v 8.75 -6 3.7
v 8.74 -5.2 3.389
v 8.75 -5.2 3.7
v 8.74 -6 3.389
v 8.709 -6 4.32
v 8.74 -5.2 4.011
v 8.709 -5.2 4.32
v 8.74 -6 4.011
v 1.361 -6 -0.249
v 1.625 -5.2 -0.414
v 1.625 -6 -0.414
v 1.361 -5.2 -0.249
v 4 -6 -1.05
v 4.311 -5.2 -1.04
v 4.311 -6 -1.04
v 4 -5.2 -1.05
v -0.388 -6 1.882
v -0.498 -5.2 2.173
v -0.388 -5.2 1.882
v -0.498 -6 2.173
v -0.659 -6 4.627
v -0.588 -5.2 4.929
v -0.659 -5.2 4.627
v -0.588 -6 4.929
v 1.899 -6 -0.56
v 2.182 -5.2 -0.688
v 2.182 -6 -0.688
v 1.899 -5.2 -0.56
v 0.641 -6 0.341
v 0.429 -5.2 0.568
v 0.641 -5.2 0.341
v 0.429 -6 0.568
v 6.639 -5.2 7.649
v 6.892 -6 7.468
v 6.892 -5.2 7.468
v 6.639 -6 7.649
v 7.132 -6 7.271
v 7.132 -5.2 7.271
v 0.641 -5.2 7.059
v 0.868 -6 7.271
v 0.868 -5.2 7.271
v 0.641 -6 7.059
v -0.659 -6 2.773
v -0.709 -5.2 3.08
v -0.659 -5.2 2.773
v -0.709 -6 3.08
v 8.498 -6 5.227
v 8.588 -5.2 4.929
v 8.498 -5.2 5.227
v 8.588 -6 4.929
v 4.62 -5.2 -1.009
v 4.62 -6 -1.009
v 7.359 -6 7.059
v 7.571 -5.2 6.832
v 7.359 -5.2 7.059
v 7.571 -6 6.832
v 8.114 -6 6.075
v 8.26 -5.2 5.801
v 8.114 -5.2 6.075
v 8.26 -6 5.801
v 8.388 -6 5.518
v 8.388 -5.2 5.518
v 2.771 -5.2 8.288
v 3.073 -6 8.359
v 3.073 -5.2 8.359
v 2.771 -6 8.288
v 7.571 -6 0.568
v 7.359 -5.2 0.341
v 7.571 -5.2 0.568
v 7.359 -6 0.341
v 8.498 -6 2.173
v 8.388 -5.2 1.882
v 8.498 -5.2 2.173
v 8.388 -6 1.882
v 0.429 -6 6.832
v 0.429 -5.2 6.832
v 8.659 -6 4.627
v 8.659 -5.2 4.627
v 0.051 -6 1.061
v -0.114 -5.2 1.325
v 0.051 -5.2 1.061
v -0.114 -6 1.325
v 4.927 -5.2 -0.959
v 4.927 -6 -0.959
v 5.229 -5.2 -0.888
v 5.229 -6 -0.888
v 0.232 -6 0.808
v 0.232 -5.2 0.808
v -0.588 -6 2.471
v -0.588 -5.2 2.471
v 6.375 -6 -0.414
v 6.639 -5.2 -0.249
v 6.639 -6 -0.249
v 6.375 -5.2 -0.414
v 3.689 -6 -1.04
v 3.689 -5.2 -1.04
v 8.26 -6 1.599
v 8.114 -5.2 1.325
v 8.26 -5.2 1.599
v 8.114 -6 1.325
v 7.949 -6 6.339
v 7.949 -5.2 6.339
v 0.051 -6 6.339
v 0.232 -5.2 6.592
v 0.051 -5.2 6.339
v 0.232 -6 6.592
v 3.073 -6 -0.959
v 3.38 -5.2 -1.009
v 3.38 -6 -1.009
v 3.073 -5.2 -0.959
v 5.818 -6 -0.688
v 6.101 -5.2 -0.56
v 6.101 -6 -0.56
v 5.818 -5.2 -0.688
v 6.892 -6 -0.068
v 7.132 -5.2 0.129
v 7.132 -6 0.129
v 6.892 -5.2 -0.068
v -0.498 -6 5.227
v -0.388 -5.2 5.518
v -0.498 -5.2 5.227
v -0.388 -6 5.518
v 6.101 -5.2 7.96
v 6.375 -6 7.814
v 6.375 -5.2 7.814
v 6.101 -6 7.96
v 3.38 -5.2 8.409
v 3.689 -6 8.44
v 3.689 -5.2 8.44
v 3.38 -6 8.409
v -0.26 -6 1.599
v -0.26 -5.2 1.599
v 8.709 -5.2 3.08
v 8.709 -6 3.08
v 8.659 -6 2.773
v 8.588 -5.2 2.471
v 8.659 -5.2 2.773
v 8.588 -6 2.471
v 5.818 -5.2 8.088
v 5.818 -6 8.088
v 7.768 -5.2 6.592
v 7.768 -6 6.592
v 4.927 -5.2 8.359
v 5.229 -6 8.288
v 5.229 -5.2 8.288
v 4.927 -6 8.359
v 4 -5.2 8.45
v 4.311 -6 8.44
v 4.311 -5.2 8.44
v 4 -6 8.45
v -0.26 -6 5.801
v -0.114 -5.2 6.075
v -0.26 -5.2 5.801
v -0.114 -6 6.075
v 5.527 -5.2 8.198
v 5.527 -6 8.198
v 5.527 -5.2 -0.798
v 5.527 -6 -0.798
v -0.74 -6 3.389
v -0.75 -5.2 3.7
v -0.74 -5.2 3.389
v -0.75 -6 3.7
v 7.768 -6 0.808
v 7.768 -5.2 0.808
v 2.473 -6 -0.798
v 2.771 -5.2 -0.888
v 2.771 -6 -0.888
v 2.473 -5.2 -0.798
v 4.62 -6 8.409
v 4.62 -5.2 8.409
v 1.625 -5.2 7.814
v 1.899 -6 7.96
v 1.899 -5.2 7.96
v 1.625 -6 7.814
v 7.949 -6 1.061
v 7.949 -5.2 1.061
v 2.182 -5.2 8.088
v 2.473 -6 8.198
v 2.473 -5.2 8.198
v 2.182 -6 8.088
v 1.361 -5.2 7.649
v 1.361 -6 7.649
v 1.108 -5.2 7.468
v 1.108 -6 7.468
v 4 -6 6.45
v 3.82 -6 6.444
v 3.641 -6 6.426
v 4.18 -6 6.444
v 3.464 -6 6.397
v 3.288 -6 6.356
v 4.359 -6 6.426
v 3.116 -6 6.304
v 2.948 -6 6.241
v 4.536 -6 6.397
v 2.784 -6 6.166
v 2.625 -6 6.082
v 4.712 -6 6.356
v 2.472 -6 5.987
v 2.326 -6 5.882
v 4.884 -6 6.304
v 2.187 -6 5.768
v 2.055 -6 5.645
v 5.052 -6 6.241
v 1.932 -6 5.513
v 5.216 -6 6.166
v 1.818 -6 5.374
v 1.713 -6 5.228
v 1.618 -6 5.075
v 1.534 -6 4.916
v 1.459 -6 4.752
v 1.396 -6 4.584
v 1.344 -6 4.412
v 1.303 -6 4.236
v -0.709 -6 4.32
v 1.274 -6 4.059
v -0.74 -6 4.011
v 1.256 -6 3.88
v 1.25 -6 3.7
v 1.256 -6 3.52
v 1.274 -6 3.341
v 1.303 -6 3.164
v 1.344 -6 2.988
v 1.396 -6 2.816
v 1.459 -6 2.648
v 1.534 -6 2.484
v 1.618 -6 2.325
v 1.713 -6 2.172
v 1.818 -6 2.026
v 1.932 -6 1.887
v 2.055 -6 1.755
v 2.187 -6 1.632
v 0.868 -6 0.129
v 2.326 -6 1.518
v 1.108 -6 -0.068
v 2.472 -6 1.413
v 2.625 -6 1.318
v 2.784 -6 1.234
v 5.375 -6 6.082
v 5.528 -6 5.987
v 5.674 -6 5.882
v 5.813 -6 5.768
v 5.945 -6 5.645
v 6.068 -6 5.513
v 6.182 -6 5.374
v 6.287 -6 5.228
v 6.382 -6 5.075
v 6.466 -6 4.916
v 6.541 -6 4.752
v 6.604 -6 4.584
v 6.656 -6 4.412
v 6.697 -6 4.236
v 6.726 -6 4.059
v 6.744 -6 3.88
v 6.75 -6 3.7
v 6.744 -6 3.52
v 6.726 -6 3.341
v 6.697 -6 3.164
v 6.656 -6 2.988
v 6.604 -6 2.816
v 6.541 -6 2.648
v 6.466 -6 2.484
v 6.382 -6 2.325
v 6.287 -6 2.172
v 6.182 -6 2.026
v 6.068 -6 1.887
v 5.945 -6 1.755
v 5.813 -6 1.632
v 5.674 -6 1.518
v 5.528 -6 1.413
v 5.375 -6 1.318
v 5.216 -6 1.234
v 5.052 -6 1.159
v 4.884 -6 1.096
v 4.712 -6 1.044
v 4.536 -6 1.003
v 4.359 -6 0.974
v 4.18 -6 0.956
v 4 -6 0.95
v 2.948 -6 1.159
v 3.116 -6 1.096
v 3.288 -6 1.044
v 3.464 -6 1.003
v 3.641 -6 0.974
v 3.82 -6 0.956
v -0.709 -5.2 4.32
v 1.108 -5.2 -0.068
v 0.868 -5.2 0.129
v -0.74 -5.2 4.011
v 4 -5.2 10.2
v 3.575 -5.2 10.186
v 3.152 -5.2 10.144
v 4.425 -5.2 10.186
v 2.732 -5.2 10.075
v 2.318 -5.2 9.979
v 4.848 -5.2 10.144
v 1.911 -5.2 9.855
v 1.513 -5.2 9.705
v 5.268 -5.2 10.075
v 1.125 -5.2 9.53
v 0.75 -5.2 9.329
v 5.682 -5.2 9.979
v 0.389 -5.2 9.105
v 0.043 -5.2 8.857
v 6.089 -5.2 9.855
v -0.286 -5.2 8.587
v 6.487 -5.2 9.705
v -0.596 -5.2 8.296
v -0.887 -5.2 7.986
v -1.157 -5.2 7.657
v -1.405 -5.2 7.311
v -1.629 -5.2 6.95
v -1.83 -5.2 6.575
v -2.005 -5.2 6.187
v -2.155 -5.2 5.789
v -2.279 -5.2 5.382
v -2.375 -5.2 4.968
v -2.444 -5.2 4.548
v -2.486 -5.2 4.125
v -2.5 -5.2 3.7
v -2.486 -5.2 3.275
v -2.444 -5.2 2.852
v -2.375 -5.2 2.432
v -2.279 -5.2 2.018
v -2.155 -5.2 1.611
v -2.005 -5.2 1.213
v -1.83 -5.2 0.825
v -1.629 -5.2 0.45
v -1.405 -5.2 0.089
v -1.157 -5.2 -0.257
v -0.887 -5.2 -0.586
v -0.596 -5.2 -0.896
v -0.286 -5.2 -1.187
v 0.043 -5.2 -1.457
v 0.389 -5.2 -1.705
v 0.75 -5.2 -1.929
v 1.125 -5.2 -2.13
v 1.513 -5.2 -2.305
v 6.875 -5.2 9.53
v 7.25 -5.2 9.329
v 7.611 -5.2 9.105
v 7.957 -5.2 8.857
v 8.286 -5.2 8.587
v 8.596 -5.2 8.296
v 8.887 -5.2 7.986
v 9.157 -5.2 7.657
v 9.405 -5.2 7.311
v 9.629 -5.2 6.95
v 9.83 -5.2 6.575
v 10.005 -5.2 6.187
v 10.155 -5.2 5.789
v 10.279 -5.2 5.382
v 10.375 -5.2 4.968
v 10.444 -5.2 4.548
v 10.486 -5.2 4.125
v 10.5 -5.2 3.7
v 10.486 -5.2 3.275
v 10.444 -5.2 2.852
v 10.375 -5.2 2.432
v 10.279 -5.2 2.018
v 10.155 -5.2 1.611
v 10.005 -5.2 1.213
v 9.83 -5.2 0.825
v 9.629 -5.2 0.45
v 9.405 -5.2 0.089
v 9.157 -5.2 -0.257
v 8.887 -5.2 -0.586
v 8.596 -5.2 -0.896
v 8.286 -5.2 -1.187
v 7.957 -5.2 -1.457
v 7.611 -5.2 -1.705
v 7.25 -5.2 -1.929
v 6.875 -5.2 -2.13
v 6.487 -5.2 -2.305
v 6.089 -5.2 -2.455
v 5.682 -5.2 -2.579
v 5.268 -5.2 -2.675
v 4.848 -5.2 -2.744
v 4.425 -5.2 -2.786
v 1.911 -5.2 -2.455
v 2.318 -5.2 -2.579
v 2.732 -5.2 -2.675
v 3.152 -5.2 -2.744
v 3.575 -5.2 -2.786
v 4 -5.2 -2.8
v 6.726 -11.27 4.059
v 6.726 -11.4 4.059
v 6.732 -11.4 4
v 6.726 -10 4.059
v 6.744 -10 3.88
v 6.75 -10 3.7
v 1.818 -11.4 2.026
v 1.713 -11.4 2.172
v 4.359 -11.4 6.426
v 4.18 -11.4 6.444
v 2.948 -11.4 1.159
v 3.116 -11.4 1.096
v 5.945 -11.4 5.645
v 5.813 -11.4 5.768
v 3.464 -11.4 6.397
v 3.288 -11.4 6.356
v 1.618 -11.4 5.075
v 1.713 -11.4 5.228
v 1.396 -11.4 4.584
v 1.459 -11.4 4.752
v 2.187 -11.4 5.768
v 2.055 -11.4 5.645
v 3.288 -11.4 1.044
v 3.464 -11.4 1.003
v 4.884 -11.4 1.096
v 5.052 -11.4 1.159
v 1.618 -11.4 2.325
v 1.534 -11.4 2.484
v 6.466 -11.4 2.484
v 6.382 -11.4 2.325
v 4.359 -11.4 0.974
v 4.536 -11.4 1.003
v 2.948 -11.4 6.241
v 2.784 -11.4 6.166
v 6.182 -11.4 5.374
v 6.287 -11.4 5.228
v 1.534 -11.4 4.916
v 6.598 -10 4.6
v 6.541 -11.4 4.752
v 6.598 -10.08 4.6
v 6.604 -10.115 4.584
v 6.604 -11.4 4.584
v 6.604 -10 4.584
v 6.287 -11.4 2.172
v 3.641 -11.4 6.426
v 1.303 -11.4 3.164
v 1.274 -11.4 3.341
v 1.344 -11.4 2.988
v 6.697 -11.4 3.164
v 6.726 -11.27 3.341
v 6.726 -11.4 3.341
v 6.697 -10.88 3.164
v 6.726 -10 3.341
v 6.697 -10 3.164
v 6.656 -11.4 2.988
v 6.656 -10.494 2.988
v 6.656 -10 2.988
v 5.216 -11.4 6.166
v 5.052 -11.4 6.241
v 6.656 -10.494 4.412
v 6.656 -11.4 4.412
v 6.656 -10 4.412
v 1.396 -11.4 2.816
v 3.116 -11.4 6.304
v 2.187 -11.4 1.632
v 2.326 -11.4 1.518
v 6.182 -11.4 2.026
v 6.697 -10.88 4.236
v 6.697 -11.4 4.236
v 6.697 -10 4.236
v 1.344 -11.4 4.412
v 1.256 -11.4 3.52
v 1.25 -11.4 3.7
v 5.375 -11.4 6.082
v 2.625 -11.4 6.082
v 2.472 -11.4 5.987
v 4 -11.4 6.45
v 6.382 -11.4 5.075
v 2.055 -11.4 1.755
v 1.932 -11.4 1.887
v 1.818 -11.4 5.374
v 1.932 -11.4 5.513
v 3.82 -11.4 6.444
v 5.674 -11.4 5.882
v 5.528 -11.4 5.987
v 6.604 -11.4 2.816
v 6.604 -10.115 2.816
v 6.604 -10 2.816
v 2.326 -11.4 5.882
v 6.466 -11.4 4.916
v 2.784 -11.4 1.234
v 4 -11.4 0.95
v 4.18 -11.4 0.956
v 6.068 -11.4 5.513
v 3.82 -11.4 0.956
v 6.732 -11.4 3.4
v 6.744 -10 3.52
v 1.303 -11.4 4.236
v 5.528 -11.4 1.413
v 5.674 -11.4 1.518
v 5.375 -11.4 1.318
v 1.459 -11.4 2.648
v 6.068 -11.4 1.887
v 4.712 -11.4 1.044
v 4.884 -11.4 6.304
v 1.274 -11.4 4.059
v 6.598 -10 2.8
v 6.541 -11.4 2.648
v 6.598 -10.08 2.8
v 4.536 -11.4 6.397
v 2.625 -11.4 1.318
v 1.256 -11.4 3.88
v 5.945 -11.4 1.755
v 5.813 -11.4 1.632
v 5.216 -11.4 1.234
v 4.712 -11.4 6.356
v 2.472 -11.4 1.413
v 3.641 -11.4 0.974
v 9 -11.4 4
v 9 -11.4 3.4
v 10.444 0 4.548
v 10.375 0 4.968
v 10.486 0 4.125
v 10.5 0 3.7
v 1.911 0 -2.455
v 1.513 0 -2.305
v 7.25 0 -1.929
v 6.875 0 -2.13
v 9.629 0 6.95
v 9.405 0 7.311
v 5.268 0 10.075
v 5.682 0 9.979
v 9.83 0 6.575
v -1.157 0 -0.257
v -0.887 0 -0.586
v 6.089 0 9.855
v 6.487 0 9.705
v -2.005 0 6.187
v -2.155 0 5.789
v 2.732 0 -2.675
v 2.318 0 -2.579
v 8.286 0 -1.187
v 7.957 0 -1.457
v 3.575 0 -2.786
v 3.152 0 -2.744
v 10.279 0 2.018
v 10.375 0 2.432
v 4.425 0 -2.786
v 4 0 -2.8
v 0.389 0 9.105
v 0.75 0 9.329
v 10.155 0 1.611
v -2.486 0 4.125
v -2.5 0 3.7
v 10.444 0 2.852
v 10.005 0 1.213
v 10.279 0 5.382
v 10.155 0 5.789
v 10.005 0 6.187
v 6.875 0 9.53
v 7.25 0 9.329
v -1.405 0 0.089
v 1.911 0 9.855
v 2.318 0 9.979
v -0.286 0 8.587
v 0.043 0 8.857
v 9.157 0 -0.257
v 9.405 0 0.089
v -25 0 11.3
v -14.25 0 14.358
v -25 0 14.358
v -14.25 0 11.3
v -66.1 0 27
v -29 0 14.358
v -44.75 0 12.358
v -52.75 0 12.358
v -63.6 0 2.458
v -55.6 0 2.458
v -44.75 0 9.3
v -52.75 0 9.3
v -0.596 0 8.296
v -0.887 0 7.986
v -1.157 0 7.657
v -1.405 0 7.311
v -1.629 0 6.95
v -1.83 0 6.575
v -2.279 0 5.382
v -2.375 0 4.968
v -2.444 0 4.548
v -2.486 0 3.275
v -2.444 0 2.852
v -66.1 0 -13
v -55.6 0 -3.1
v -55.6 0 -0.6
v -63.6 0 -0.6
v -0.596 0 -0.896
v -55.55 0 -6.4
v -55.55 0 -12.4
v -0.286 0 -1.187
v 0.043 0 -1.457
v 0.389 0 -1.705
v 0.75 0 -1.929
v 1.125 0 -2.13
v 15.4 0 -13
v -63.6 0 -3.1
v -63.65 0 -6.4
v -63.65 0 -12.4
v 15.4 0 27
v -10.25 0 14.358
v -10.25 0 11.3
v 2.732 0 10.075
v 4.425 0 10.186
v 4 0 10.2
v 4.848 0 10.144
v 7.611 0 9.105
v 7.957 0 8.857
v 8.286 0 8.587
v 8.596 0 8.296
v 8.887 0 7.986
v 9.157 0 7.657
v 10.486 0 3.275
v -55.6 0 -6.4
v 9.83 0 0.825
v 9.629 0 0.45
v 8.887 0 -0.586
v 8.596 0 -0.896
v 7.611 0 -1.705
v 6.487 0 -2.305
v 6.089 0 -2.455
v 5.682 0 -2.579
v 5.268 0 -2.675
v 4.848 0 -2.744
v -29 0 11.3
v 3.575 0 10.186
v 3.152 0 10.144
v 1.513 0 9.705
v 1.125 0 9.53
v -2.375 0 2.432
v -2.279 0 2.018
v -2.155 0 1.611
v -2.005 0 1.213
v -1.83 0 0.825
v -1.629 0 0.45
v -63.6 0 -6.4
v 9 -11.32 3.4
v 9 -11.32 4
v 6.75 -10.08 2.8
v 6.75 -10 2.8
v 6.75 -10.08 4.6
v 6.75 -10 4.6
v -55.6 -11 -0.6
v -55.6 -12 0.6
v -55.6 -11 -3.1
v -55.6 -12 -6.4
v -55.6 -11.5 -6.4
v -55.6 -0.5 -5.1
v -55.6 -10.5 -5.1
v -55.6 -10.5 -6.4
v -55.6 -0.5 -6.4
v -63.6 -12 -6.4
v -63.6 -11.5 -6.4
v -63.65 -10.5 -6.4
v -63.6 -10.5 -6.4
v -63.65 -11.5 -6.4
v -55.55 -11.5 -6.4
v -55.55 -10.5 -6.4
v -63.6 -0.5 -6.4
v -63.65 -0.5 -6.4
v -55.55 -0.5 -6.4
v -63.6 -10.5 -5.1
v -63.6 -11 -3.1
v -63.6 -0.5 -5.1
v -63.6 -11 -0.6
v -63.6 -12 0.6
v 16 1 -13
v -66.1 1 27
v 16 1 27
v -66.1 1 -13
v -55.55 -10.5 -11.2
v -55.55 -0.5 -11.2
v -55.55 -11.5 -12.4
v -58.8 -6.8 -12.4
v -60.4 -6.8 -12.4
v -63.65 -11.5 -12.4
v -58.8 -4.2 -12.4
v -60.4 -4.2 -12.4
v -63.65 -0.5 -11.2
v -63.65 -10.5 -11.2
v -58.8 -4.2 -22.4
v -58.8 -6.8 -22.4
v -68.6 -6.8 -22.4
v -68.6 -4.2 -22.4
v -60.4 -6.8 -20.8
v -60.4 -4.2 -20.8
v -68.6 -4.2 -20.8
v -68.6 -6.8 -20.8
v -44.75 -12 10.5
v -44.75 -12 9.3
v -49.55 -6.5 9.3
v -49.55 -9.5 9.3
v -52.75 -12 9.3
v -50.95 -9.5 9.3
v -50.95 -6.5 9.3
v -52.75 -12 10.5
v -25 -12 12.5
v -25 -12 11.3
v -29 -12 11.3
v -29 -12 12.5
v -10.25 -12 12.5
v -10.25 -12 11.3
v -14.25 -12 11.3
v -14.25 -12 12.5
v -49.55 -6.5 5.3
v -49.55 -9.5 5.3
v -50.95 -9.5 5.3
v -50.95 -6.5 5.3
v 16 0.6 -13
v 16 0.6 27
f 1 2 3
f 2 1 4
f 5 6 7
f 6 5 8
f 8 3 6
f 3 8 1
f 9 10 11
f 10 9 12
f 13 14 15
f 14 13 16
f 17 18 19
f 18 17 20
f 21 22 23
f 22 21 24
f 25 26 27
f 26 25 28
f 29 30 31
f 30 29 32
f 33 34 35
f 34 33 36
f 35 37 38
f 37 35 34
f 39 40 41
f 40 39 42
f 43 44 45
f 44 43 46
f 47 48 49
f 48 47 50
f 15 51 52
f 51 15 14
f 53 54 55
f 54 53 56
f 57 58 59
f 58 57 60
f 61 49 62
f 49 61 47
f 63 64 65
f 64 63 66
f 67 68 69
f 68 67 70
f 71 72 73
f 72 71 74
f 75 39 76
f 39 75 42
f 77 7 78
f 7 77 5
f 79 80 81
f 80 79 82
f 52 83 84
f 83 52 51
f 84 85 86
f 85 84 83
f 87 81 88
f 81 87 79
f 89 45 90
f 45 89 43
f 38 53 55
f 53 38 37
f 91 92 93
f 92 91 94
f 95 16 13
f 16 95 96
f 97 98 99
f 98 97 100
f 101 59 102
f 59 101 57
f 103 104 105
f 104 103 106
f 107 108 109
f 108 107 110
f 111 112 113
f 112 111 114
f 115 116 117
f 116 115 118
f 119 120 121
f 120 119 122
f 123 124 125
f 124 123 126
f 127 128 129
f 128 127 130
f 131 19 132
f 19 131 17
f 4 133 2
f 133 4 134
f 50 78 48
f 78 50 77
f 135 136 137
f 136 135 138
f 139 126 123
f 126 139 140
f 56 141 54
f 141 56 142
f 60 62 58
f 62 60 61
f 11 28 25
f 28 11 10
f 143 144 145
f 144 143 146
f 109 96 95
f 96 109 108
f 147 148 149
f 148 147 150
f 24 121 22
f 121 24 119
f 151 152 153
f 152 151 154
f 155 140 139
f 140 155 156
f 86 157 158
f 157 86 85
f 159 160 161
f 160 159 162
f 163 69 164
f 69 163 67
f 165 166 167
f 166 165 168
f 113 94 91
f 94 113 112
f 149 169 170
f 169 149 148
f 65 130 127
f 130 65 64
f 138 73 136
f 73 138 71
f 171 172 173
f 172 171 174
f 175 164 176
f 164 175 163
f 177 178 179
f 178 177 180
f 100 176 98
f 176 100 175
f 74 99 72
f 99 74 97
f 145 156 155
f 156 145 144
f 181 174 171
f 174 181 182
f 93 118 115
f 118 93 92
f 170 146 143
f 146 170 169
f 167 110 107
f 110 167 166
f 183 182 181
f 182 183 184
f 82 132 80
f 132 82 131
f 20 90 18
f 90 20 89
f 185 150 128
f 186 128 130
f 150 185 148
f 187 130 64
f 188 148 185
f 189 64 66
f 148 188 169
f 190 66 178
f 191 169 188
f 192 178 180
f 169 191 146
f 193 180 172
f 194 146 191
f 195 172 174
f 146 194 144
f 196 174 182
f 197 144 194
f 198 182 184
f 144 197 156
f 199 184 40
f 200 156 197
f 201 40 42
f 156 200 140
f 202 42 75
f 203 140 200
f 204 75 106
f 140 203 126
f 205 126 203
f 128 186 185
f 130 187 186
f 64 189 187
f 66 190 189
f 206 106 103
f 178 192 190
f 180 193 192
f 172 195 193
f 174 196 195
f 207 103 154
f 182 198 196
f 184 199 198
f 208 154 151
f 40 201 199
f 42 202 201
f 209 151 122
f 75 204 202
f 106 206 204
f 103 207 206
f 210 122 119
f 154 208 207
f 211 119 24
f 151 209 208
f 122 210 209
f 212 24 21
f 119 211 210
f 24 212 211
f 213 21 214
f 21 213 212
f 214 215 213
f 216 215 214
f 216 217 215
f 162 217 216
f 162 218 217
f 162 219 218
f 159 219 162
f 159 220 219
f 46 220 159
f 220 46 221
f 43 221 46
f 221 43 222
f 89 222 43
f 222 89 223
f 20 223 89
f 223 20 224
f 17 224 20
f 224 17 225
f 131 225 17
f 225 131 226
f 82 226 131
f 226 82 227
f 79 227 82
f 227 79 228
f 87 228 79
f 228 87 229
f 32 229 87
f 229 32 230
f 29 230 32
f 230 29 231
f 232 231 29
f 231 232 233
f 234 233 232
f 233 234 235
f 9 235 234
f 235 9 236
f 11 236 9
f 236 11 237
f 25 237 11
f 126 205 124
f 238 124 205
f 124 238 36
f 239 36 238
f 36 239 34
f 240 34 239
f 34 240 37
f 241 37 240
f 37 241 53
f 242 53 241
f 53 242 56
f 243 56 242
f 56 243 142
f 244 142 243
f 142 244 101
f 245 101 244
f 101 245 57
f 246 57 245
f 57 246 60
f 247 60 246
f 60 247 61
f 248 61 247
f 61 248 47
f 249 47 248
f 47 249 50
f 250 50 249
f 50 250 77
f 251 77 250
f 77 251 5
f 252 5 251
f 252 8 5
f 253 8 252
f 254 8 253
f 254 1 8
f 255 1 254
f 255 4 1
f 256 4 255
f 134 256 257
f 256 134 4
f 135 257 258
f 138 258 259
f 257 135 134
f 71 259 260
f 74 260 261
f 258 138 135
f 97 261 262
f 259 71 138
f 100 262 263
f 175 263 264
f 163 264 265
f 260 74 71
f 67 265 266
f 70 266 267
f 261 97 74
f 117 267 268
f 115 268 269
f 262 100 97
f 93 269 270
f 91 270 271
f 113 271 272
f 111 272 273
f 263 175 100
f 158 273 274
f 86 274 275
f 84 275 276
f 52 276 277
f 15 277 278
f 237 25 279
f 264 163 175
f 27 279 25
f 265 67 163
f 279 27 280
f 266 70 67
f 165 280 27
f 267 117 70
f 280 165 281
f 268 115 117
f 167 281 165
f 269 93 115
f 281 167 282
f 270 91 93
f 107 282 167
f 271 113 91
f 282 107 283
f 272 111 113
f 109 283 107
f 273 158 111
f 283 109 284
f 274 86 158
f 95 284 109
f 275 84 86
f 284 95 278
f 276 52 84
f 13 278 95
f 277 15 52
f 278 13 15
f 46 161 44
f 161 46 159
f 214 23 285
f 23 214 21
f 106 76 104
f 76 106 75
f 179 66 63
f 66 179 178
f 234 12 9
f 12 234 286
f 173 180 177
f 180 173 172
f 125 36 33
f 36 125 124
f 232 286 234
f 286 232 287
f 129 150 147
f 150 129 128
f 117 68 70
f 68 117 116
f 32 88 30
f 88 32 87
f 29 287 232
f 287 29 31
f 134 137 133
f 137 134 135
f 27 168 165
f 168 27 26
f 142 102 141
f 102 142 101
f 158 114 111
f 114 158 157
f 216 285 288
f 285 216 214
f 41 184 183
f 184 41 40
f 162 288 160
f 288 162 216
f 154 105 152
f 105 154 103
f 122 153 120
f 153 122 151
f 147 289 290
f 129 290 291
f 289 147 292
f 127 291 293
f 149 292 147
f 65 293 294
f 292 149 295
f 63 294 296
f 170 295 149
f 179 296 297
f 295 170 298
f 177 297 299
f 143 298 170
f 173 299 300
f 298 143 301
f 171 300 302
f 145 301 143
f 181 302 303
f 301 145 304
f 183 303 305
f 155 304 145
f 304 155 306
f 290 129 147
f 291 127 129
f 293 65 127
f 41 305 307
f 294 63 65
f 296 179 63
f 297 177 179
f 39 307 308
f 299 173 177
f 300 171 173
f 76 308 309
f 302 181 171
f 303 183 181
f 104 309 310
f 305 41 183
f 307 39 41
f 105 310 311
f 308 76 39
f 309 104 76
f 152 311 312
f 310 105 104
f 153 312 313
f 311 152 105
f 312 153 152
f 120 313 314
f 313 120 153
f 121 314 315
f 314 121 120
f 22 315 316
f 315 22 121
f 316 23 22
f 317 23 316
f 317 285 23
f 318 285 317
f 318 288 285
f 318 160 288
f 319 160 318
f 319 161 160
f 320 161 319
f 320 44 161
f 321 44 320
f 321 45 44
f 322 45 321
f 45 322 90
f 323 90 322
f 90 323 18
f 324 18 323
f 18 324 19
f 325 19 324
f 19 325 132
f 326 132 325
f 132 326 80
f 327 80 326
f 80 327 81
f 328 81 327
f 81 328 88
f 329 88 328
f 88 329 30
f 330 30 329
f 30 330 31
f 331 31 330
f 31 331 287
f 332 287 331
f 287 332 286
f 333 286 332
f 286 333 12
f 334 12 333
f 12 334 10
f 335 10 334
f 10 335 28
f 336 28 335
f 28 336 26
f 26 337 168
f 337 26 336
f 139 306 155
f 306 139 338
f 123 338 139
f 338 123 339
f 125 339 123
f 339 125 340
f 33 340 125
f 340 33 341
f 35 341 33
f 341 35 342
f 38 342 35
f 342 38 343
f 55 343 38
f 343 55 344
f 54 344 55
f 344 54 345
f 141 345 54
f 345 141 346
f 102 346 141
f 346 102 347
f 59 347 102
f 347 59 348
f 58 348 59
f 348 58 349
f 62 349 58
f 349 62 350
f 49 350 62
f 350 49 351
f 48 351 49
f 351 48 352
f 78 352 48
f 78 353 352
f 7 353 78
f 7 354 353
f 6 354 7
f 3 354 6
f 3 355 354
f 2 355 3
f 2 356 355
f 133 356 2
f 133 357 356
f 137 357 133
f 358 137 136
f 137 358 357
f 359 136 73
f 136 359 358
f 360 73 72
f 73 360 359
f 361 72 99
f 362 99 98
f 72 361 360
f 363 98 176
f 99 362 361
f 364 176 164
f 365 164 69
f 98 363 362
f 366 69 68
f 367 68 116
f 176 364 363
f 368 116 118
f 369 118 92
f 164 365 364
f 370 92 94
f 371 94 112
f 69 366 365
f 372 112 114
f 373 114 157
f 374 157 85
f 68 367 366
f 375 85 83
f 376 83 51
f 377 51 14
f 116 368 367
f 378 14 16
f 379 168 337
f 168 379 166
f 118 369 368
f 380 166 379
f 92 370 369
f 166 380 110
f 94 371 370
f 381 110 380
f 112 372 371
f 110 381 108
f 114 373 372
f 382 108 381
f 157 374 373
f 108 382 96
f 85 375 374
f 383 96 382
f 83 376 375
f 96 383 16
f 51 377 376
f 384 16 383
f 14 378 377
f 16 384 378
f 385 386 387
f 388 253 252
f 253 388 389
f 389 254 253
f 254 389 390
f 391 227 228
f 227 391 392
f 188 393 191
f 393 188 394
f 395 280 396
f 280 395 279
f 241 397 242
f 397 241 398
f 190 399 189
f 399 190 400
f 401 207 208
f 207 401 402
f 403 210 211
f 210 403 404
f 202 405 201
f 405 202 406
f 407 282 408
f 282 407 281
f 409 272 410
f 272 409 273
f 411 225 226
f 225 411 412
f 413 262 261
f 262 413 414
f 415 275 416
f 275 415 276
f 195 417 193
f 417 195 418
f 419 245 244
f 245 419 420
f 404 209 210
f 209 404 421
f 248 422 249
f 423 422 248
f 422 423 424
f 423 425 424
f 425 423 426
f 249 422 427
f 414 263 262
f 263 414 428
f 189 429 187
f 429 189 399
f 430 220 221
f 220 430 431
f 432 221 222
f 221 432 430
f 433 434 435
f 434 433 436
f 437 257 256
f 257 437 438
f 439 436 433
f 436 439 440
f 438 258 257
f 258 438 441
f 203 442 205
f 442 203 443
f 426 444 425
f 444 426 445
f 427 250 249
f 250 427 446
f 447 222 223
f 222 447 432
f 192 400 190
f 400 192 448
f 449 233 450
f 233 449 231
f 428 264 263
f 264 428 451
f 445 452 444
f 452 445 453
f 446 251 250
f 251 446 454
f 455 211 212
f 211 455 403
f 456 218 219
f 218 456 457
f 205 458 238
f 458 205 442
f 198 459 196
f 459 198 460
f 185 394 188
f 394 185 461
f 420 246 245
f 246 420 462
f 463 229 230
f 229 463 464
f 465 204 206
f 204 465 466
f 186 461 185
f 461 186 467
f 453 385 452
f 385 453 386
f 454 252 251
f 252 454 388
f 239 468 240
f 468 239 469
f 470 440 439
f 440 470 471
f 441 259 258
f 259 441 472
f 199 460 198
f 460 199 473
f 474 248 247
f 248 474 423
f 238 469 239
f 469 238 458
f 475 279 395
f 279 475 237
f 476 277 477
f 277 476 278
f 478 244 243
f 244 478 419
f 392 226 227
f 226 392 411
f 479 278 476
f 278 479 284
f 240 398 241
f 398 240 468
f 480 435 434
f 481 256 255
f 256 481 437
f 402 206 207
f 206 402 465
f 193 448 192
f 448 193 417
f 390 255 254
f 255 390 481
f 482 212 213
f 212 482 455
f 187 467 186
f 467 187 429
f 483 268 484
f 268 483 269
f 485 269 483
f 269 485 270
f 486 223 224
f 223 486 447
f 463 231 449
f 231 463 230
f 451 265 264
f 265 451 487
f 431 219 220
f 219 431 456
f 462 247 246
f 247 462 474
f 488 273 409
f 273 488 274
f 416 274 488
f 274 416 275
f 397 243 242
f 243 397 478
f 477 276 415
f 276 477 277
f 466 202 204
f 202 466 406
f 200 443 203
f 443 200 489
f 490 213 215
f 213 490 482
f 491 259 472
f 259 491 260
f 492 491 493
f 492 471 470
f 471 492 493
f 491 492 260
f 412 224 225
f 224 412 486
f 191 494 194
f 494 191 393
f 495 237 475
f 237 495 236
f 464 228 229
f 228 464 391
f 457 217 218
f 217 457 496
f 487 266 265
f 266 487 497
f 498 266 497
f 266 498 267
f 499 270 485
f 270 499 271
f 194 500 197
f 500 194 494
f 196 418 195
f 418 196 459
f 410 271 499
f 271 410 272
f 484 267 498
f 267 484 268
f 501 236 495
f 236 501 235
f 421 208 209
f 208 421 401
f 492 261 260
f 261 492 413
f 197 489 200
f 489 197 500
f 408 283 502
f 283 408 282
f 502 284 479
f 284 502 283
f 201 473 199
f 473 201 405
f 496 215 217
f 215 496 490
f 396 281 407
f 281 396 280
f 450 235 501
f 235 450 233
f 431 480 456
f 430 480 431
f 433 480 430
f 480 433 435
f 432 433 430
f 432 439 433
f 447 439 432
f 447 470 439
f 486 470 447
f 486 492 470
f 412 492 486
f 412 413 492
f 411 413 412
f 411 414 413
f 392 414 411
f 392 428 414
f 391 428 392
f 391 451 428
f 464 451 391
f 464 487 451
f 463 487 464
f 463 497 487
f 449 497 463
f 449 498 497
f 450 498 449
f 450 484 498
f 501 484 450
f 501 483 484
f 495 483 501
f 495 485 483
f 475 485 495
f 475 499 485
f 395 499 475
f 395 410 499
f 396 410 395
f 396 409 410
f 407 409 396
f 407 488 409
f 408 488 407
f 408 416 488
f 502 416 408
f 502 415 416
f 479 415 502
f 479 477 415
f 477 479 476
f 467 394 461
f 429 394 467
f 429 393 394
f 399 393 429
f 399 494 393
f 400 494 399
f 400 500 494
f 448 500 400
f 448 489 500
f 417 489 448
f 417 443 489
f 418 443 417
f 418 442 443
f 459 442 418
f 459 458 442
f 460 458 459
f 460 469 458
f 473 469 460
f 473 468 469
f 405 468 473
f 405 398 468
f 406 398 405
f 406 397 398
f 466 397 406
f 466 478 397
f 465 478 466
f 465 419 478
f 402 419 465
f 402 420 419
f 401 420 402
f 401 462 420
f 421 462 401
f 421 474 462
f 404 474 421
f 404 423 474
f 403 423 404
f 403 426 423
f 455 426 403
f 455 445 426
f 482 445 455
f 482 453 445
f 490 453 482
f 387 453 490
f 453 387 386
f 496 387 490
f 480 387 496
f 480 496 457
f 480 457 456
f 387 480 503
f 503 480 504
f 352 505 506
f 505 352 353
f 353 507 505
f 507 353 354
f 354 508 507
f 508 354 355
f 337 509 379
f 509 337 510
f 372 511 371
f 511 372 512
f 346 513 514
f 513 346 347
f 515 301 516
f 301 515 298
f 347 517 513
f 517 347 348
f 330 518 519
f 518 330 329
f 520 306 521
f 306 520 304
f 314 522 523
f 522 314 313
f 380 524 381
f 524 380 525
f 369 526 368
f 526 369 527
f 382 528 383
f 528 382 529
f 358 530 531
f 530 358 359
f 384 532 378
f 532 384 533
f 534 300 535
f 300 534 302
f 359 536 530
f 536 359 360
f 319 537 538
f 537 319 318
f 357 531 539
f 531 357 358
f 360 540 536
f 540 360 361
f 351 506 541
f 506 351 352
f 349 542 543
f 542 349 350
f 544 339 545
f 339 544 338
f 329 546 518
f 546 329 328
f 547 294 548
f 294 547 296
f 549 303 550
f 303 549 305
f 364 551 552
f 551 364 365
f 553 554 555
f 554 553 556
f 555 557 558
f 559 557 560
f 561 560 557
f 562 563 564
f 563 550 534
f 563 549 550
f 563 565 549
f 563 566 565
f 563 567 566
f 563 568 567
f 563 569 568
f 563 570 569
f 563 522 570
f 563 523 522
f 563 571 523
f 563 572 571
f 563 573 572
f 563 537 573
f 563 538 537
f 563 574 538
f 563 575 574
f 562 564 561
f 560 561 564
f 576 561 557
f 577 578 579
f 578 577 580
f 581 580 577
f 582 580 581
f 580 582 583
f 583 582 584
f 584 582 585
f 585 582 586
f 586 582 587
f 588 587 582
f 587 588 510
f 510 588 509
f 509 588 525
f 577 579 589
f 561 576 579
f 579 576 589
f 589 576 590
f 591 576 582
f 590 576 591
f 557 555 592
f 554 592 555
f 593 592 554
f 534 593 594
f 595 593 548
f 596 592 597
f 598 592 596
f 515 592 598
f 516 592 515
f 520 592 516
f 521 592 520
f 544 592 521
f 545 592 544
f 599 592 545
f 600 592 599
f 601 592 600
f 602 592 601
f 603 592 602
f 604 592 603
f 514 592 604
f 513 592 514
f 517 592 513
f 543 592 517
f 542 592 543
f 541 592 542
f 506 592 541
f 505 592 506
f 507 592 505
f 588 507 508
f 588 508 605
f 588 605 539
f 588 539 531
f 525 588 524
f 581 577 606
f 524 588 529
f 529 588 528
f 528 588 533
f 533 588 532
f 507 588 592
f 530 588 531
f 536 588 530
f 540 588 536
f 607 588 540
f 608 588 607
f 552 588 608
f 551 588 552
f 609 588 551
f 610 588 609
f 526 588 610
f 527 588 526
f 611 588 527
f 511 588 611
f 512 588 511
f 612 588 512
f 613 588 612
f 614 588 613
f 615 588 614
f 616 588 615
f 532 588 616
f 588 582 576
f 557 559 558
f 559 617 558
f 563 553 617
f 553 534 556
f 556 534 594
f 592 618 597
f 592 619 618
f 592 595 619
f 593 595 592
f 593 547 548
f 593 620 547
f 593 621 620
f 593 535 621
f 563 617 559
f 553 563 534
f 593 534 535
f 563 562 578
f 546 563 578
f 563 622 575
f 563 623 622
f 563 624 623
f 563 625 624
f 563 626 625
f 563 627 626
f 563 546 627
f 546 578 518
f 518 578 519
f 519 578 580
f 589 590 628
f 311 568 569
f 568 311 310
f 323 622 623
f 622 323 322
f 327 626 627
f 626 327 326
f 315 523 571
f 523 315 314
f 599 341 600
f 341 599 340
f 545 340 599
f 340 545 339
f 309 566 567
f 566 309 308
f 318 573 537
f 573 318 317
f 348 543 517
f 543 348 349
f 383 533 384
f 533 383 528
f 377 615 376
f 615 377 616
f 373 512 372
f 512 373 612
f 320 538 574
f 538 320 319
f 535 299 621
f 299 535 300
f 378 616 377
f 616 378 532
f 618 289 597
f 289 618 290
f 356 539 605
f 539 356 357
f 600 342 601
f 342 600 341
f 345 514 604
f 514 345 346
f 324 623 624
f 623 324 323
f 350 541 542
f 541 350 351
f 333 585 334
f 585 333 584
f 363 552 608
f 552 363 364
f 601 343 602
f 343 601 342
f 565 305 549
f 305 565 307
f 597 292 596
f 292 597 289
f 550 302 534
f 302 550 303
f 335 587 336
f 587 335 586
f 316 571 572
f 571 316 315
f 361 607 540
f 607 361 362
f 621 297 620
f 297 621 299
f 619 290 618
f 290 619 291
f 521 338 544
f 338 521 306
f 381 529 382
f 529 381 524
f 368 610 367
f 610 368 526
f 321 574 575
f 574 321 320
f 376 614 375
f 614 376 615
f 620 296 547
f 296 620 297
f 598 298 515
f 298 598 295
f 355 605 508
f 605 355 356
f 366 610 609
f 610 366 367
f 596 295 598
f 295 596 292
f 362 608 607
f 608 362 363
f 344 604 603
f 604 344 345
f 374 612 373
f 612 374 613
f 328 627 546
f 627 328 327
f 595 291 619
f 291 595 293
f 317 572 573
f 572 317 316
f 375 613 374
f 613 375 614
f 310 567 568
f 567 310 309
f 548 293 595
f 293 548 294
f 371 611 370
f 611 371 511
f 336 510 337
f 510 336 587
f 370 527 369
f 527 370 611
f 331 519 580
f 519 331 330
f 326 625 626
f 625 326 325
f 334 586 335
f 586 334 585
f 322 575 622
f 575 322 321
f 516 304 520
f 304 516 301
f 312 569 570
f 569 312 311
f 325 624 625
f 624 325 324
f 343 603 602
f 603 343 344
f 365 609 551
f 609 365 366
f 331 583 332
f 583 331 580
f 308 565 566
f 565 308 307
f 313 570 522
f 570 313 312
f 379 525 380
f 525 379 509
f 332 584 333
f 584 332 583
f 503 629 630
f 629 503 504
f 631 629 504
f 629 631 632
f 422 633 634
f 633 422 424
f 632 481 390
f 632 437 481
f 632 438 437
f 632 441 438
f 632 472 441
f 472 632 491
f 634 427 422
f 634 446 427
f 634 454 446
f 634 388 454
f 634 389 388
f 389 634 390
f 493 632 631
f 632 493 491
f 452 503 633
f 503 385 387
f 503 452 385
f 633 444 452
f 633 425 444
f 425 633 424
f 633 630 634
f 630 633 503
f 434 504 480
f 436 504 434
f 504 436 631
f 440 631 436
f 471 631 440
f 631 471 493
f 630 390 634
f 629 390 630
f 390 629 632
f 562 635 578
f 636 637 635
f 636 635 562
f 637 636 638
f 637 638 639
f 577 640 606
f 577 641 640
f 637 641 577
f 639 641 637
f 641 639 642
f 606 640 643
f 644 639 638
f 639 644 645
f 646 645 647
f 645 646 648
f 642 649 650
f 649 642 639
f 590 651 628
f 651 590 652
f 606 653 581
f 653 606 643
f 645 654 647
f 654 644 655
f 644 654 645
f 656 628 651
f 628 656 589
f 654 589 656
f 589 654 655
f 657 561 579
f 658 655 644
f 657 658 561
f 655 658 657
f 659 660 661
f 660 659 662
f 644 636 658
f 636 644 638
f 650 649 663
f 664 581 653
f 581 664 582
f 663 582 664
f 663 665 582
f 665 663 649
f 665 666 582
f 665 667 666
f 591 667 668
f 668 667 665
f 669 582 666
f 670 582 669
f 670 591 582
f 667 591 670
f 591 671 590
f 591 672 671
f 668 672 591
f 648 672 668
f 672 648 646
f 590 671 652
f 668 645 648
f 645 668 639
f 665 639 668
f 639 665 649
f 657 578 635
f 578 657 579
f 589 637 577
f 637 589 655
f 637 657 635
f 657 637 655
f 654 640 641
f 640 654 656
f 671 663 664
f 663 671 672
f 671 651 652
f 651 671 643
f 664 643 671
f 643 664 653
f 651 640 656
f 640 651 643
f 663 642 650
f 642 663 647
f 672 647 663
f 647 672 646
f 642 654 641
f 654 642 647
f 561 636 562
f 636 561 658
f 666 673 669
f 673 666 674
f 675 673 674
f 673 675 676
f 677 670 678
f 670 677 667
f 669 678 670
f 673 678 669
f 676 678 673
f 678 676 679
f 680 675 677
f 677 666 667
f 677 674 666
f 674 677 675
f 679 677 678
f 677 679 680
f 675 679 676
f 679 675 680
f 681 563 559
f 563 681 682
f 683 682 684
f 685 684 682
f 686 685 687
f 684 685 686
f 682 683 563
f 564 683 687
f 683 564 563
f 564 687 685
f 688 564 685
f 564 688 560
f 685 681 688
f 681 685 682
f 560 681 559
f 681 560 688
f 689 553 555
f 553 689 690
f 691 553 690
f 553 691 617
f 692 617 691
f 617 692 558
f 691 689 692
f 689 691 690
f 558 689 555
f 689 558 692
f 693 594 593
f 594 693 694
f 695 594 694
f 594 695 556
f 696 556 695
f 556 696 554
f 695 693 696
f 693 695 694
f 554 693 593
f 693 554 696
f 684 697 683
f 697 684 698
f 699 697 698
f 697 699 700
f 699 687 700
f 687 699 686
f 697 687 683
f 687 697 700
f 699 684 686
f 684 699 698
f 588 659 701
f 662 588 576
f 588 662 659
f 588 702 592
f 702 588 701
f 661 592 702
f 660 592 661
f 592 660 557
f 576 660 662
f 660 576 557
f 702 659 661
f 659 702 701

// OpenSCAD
// DOUBLE TAKE FRAMES — STANDARD/WET CLIPLESS KEYED LATCH RIG
// DTF_RELEASE: 4.0.0
// Release revision: 4.0.0
// Versioning: Semantic Versioning 2.0.0 (https://semver.org/)
// Status: CANONICAL.
// Set wet=false for the unchanged neutral/standard wall rig. Set wet=true to
// mirror the complete fixed rig in X and omit the zipper tunnel/crook package.
// The wet pivot and bayonet therefore move to the opposite end so the latch
// swings toward the intact side of its suspension line rather than toward the
// side-load break.
// Pending change: adds a print-friendly bayonet stop lug to the pivot peg so
// the keyed latch needs no C-clip. On this mirrored dry-wall rig, the lug faces
// outward toward +X (right in the backside/SCAD view), preventing the released, downward-
// hanging latch keyway from aligning with it and slipping off.
// Changes in 2.0.4:
// - Carried forward unchanged for the coordinated capstan and clock-string-guide release.
// Changes in 2.0.3:
// - Carried forward unchanged for the corrected prepared-project packaging.
// Changes in 2.0.2:
// - Carried forward unchanged for the native 3MF packaging hotfix.
// Changes in 2.0.1:
// - Carried forward unchanged for the prepared-project packaging correction.
// Changes in 2.0.0:
// - Carried forward without geometry changes for the coordinated 2.0.0 release.
// Full release notes: https://doubletakeframes.com/build/#design-release
//
// Public dry-wall rig source. This file contains only the fixed rig; the
// standalone latch-and-keeper source is the sole authority for moving parts.
$fn = 96;

inch = 25.4;
eps  = 0.05;

// false = unchanged neutral/standard rig with zipper tunnel architecture
// true  = wet eyelet-swing rig with the entire zipper tunnel/crook omitted
wet = false;

// =========================================================
// CONVENTIONAL FRAME
// x: right is +
// y: away from viewer is +
// z: up is +
// wall plane is y = 0
//
// mounted hardware projecting toward viewer lives in NEGATIVE y
// =========================================================

// =========================================================
// GLOBAL / WALL
// =========================================================
show_wall = true;
wall_t    = 1.0;

// wall will auto-expand to fit both latch base and tunnel
wall_margin = 5;
// 
// LATCH BASE PARAMS
// =========================================================
pad_w = 16;   // X
pad_h = 16;   // Z
pivot_boss_d = 13.0;

standoff_d = 9.5;
standoff_h = 0.8;   // along Y
post_d     = 5.5;
post_h     = 4.0;   // along Y
// The bayonet needs no reduced C-clip groove. Continue the full post diameter
// through the upper lug-ramp section for strength and layer support.
neck_d     = post_d;
neck_h     = 1.4;   // bayonet lug ramp length along Y

// One minimal bayonet nub. Its outer radius is reached gradually across the
// 1.4 mm upper ramp length, avoiding an unsupported shelf when the wall panel
// prints flat. The mating latch has one loose arm-side bore recess.
bayonet_lug_outer_r = 5.00;
bayonet_lug_tangent_w = 1.80;
bayonet_lug_root_overlap = 0.60;
bayonet_lug_slice_y = 0.08;
// The unrotated hull grows toward +X: outward/right in the mirrored dry rig's
// backside/SCAD view.
bayonet_lug_angle = 0;
// A symmetric one-nozzle-wide outer tip is simpler and more reliable than a
// barely visible one-sided taper. The structural root remains 1.80 mm wide.
bayonet_lug_tip_w = 0.60;

// The corral is the Y source of truth. Center the eye plane on its complete
// outer depth, then derive the wall-rooted pad extension needed to put the
// shoulder/post stack there.
corral_clear_d_y = 13.0;
corral_wall_t = 1.2;
corral_global_outer_y1 = -0.30;
corral_center_y_target = corral_global_outer_y1
                         - (corral_clear_d_y + 2*corral_wall_t)/2;
pad_t = -corral_center_y_target - standoff_h - post_h/2;

// These are retained only because tunnel placement is still
// logically referenced from where the latch bar tip used to be.
eye_outer_d = 14.0;
arm_len     = 1.5 * inch;
tip_len     = 2.0;

// =========================================================
// LATCH BASE Y STACK
// =========================================================
pad_y_wall = 0;
pad_y_out  = -pad_t;

standoff_y0 = pad_y_out;
standoff_y1 = standoff_y0 - standoff_h;

post_y0 = standoff_y1;
post_y1 = post_y0 - post_h;

neck_y0 = post_y1;
neck_y1 = neck_y0 - neck_h;

// =========================================================
// LATCH REFERENCE X/Z GEOMETRY
// =========================================================
bar_x_inner = -(eye_outer_d/2 - 0.5);
bar_x_outer = bar_x_inner - arm_len;

// Legacy fixed-rig datum only. The old solid extension at this location was
// an abandoned bevel experiment and is intentionally not part of the latch.
tip_x0 = bar_x_outer - tip_len;
tip_x1 = bar_x_outer;

// =========================================================
// STANDALONE LATCH INTERFACE DATUMS
// =========================================================
latch_t = 3.4;

// Solid far-end extension outside the centered 41.5 mm weight pocket. Five
// millimeters leaves useful material on every side of the enclosed key socket.
corral_end_wall_t_x = 5.0;

// Keep the weight pocket on the canonical paper/cassette centerline. The new
// 5 mm keyed extension grows only toward the zipper, so move the zipper package
// left by the same 5 mm to preserve the original tunnel-to-corral gap.
latch_package_shift_x = 0;
zipper_package_shift_x = -corral_end_wall_t_x;
pivot_x = 4.0 + latch_package_shift_x;

// Keep the latch eye centered within the 4 mm post length. Because pad_t is
// derived above, the eye plane also lands on the corral's Y centerline.
latch_install_y = post_y1 + (post_h-latch_t)/2;

corral_clear_w_x = 41.5;
corral_depth_z = 8.0;
corral_floor_t = 1.2;
canonical_weight_center_x = -27.0;

// Size changes are split evenly across the pocket so the weight, cassette,
// and paper retain their shared canonical X centerline.
corral_inner_x0 = canonical_weight_center_x - corral_clear_w_x/2;
corral_inner_x1 = canonical_weight_center_x + corral_clear_w_x/2;
// Add a solid keyed extension beyond the 41.5 mm weight pocket.
corral_floor_x0 = corral_inner_x0 - corral_end_wall_t_x;
corral_floor_x1 = corral_inner_x1 + corral_wall_t;

// Keep the floor close to the frame wall while clearing it through the swing.
// The frame wall itself is the +Y side and broad anti-racking stop.
corral_outer_y1 = corral_global_outer_y1 - latch_install_y;
corral_inner_y1 = corral_outer_y1 - corral_wall_t;
corral_inner_y0 = corral_inner_y1 - corral_clear_d_y;
corral_outer_y0 = corral_inner_y0 - corral_wall_t;

corral_global_outer_y0 = latch_install_y + corral_outer_y0;
corral_global_inner_y0 = latch_install_y + corral_inner_y0;
corral_global_inner_y1 = latch_install_y + corral_inner_y1;

// =========================================================
// TUNNEL PARAMS
// =========================================================
tunnel_w_x = 8.0;
tunnel_d_y = 13.0;
tunnel_h_z = 14.0;       // retained only to preserve the canonical -7 mm floor
tunnel_roof_t_z = 1.2;   // printable roof above the unchanged zipper slot

slot_margin_y = 1;
slot_h_z      = 2.5;
slot_offset_z = -2.45; // local slot datum; package-level Z shift is applied below

// underside cubby
cubby_wall_y  = 1.0;
cubby_drop_z  = 6;
cubby_depth_z = 6.1;  // gains the 1.1 mm removed from the zipper-head slot
cubby_extra_y = -1.0;
cubby_floor_z = 1.2;

// placement controls
tunnel_gap_from_tip = 4.0;
tunnel_mount_dx     = zipper_package_shift_x;
tunnel_mount_dz     = 0.6;

tunnel_y_back  = 1;
tunnel_y_front = tunnel_y_back - tunnel_d_y;

// =========================================================
// CROOK PARAMS
// =========================================================
crook_w_x      = 1.6;
crook_t_y      = 2.6;
crook_drop_z   = 10.0;
crook_left_dx  = 9.0;
crook_rise_z   = 6.0;
crook_mount_dx = 0.0;
crook_mount_dy = 0.0;

// =========================================================
// DERIVED TUNNEL PLACEMENT
// =========================================================
tunnel_x1 = tip_x0 - tunnel_gap_from_tip + tunnel_mount_dx;
tunnel_x0 = tunnel_x1 - tunnel_w_x;

tunnel_corral_gap_x = corral_floor_x0 - tunnel_x1;
assert(tunnel_corral_gap_x >= 2.0,
       str("Tunnel-to-corral X gap too small: ",
           tunnel_corral_gap_x, " mm"));

tunnel_z0 = -tunnel_h_z/2 + tunnel_mount_dz;

slot_x0 = tunnel_x0 - eps;
slot_x1 = tunnel_x1 + eps;

slot_y0 = tunnel_y_front + slot_margin_y;
slot_y1 = tunnel_y_back  - slot_margin_y;

// Decouple the zipper datum from the now-trimmed tunnel roof. This preserves
// the canonical slot at -3.7..-1.2 mm while allowing dead mass above it to go.
slot_zc = tunnel_mount_dz + slot_offset_z;
slot_z0 = slot_zc - slot_h_z/2;
slot_z1 = slot_zc + slot_h_z/2;
tunnel_z1 = slot_z1 + tunnel_roof_t_z;

// =========================================================
// PRIMARY LATCH Z DATUM
// =========================================================
// Preserve the established corral and pivot Z datums while raising only the
// zipper package. The physical prototype retains more gap than the nominal CAD
// stack predicts, so the +0.6 mm shift intentionally closes more of the
// observed as-printed clearance without moving the corral or pivot.
corral_floor_z0 = -0.90;
zipper_corral_nominal_gap_z = corral_floor_z0 - slot_z1;
corral_floor_z  = corral_floor_z0 + corral_floor_t;
corral_wall_z1 = corral_floor_z + corral_depth_z;
pivot_z = (corral_floor_z0 + corral_wall_z1) / 2;

//=========================================================
// SINGLE FN WHEEL-WEIGHT GARAGE
// =========================================================
garage_slide_clear_x = 0.30;
garage_slide_clear_y = 0.30;
garage_roof_overlap_x = 3.0;
garage_roof_underside_z = corral_floor_z + 9.0;
garage_roof_t_z = 1.2;
garage_roof_cup_run_y = 4.0;
garage_roof_cup_drop_z = 0.60;
garage_middle_roof_w_x = 4.0;
garage_right_roof_w_x = garage_middle_roof_w_x;
garage_right_roof_center_x = corral_inner_x1 - 6.0;
garage_middle_right_raise_z = 2.0;

// Paper-safe reinforcement for wall-rooted horizontal features. The added
// material is tallest at the wall and tapers to zero at the free edge, so a
// descending sheet encounters a glide ramp rather than a square shoulder.
paper_ramp_root_h_z = 2.0;
paper_ramp_slice_y = 0.08;

// The pivot radius locates the corral in X, so no fixed -X stop is required.
// The left roof remains wall-rooted and carries the loose Y-retention tooth.
garage_left_roof_x0 = corral_floor_x0;
weight_clear_x0 = corral_floor_x0 - garage_slide_clear_x;

blinder_y0 = corral_global_outer_y0 - garage_slide_clear_y;
blinder_y1 = tunnel_y_back;
garage_roof_cup_y1 = blinder_y0 + garage_roof_cup_run_y;
blinder_z0 = tunnel_z1;
blinder_z1 = garage_roof_underside_z + garage_roof_t_z;
blinder_h_z = blinder_z1 - blinder_z0;

// Far-end Y key. A roof-hung vertical tooth drops into a socket that is fully
// enclosed in X and Y and open only at the top. The latch swings downward to
// disengage it; the pivot remains the sole right-end restraint.
latch_key_tooth_w_x = 1.4;
latch_key_tooth_w_y = 3.0;
latch_key_clear_xy = 0.60;
latch_key_clear_z = 0.60;
latch_key_engagement_z = 3.0;
latch_key_roof_overlap_z = 0.30;

latch_key_xc = (corral_floor_x0 + corral_inner_x0) / 2;
latch_key_local_yc = (corral_outer_y0 + corral_outer_y1) / 2;
latch_key_global_yc = latch_install_y + latch_key_local_yc;

latch_key_tooth_x0 = latch_key_xc - latch_key_tooth_w_x/2;
latch_key_tooth_x1 = latch_key_xc + latch_key_tooth_w_x/2;
latch_key_notch_x0 = latch_key_tooth_x0 - latch_key_clear_xy;
latch_key_notch_x1 = latch_key_tooth_x1 + latch_key_clear_xy;

latch_key_tooth_y0 = latch_key_global_yc - latch_key_tooth_w_y/2;
latch_key_tooth_y1 = latch_key_global_yc + latch_key_tooth_w_y/2;
latch_key_notch_y0 = latch_key_local_yc
                     - latch_key_tooth_w_y/2 - latch_key_clear_xy;
latch_key_notch_y1 = latch_key_local_yc
                     + latch_key_tooth_w_y/2 + latch_key_clear_xy;

latch_key_tooth_z0 = corral_wall_z1 - latch_key_engagement_z;
latch_key_tooth_z1 = garage_roof_underside_z
                     + latch_key_roof_overlap_z;
latch_key_notch_z0 = latch_key_tooth_z0 - latch_key_clear_z;

// Preserve the roof overlap over the actual weight pocket while leaving the
// far end open in X; the pivot radius now supplies all X location.
garage_left_roof_x1 = corral_inner_x0 + garage_roof_overlap_x;

// Carry the full guard clearance through the supporting geometry below.
// The pivot pedestal is circular; rectangular corners add no useful support
// and intrude into the corral's swept envelope.
latch_pad_x0 = pivot_x - pivot_boss_d/2;
latch_pad_x1 = pivot_x + pivot_boss_d/2;
// =========================================================

// =========================================================
// VISOR
// =========================================================
visor_t_z        = 1.0;
visor_overlap_x  = 1.0;
visor_extra_y    = .5;

visor_x0    = tunnel_x1 - visor_overlap_x;
visor_x1    = weight_clear_x0;

visor_y0    = tunnel_y_front - visor_extra_y;
visor_y1    = tunnel_y_back;

visor_z0    = tunnel_z1 - visor_t_z;
visor_z1    = tunnel_z1;

// =========================================================
// VISOR DROP
// =========================================================
visor_drop_y_t = 1.0;
visor_drop_z   = 14.0;

visor_drop_x0 = visor_x0;
visor_drop_x1 = visor_x1;

visor_drop_y0 = visor_y0;
visor_drop_y1 = visor_y0 + visor_drop_y_t;

visor_drop_z0 = visor_z0 - visor_drop_z;
visor_drop_z1 = visor_z0;

// =========================================================
// INNER STOP
// =========================================================
inner_stop_x_w       = 2.0;
inner_stop_gap_z     = 0.8;
inner_stop_depth_y   = 3.0;

inner_stop_x0 = visor_x1 - inner_stop_x_w;
inner_stop_x1 = visor_x1;

inner_stop_y0 = -inner_stop_depth_y;
inner_stop_y1 = wall_t;

inner_stop_z0 = slot_z1 + inner_stop_gap_z;
inner_stop_z1 = visor_z0;

// =========================================================
// AUTO WALL FOOTPRINT
// =========================================================
hardware_x0 = min(latch_pad_x0, tunnel_x0);
hardware_x1 = max(latch_pad_x1, visor_x1);

// Preserve the hardware-derived values for clearance checks, but do not let
// them resize the backing plane. The current structures are X-indifferent and
// remain at their present coordinates inside the canonical wall rectangle.
hardware_z0 = min(-pad_h/2, min(tunnel_z0 - cubby_drop_z, visor_drop_z0));
hardware_z1 = max( pad_h/2, tunnel_z1);

weight_pocket_center_x = (corral_inner_x0 + corral_inner_x1) / 2;
assert(abs(weight_pocket_center_x - canonical_weight_center_x) < eps,
       str("Weight pocket left canonical X centerline: ",
           weight_pocket_center_x, " mm"));

// Preserve the canonical wall plane's absolute bounds as well as its size.
// Its historical rectangle is slightly asymmetric around the weight path.
canonical_wall_x0 = -66.1;
canonical_wall_x1 =  16.0;
canonical_wall_z0 = -13.0;
canonical_wall_z1 =  27.0;

// Shared wet-assembly mirror datum. The standalone wet latch uses the same
// midpoint, keeping every mating interface registered while preserving this
// rig's complete outer X envelope.
wet_assembly_mirror_x = (canonical_wall_x0 + canonical_wall_x1) / 2;

wall_w = canonical_wall_x1 - canonical_wall_x0;
wall_h = canonical_wall_z1 - canonical_wall_z0;

// The rig slides toward +X into the cassette's left-side capture lips. The
// bevel is an X/Y cross-section extruded along the complete right edge in Z:
// its top face stops short and slopes down toward the +X tip, while the bottom
// face remains flat and full-length as the sliding datum.
rig_right_edge_lead_in = 0.60;
rig_right_edge_nose_t = wall_t - rig_right_edge_lead_in;

// =========================================================
// HELPERS
// =========================================================
module rect_prism(x0, x1, y0, y1, z0, z1) {
    translate([min(x0,x1), min(y0,y1), min(z0,z1)])
        cube([abs(x1-x0), abs(y1-y0), abs(z1-z0)]);
}

module cyl_y_span(d, y0, y1) {
    translate([0, max(y0,y1), 0])
        rotate([90,0,0])
            cylinder(d=d, h=abs(y1-y0), center=false);
}

module tunnel_crook() {
    crook_top_z = tunnel_z0 - cubby_drop_z;

    crook_xc = (slot_x0 + slot_x1) / 2 + crook_mount_dx;
    crook_yc = ((slot_y0 - cubby_extra_y/2) + (slot_y1 + cubby_extra_y/2)) / 2 + crook_mount_dy;

    crook_vert_x0 = crook_xc - crook_w_x/2;
    crook_vert_x1 = crook_xc + crook_w_x/2;
    crook_vert_y0 = crook_yc - crook_t_y/2;
    crook_vert_y1 = crook_yc + crook_t_y/2;
    crook_vert_z0 = crook_top_z - crook_drop_z;
    crook_vert_z1 = crook_top_z;

    crook_horiz_x0 = crook_xc - crook_left_dx;
    crook_horiz_x1 = crook_xc;
    crook_horiz_y0 = crook_vert_y0;
    crook_horiz_y1 = crook_vert_y1;
    crook_horiz_z0 = crook_vert_z0;
    crook_horiz_z1 = crook_vert_z0 + crook_w_x;

    union() {
        rect_prism(crook_vert_x0, crook_vert_x1, crook_vert_y0, crook_vert_y1, crook_vert_z0, crook_vert_z1);
        rect_prism(crook_horiz_x0, crook_horiz_x1, crook_horiz_y0, crook_horiz_y1, crook_horiz_z0, crook_horiz_z1);
    }
}
module carriage_blinders() {
    // Roof-hung positive tooth. Its upper end overlaps the left roof so it is
    // not a side cantilever from the wall.
    rect_prism(latch_key_tooth_x0, latch_key_tooth_x1,
               latch_key_tooth_y0, latch_key_tooth_y1,
               latch_key_tooth_z0, latch_key_tooth_z1);

    // Three wall-rooted roof lips provide Z retention while leaving open space
    // for the tether. The right lip duplicates the middle one without adding
    // another vertical guide beside the pivot.
    garage_roof_lip(garage_left_roof_x0,
                    garage_left_roof_x1,
                    false);

    translate([0, 0, garage_middle_right_raise_z]) {
        garage_roof_lip((corral_inner_x0 + corral_inner_x1)/2
                            - garage_middle_roof_w_x/2,
                        (corral_inner_x0 + corral_inner_x1)/2
                            + garage_middle_roof_w_x/2,
                        false);

        garage_roof_lip(garage_right_roof_center_x
                            - garage_right_roof_w_x/2,
                        garage_right_roof_center_x
                            + garage_right_roof_w_x/2,
                        false);
    }
}

module paper_glide_ramp(x0, x1, free_y, root_y, base_z) {
    // A zero-height endpoint is represented by a very shallow embedded slice
    // so the hull remains manifold and merges cleanly into the base plate.
    hull() {
        rect_prism(x0, x1,
                   free_y, free_y + paper_ramp_slice_y,
                   base_z - eps, base_z);
        rect_prism(x0, x1,
                   root_y - paper_ramp_slice_y, root_y,
                   base_z - eps, base_z + paper_ramp_root_h_z);
    }
}

module garage_roof_lip(x0, x1, include_cup=true) {
    nose_slice_y = 0.05;

    // Flat wall-rooted portion.
    rect_prism(x0, x1,
               garage_roof_cup_y1, blinder_y1,
               garage_roof_underside_z, blinder_z1);

    paper_glide_ramp(x0, x1,
                     garage_roof_cup_y1, blinder_y1,
                     blinder_z1);

    if (include_cup) {
        // The left roof retains its shallow outer cup because it also carries
        // the keyed end structure. The middle and right ribs stop 4 mm sooner
        // over the weight's main body rather than following the round flange.
        hull() {
            rect_prism(x0, x1,
                       garage_roof_cup_y1 - nose_slice_y,
                       garage_roof_cup_y1,
                       garage_roof_underside_z, blinder_z1);

            rect_prism(x0, x1,
                       blinder_y0,
                       blinder_y0 + nose_slice_y,
                       garage_roof_underside_z - garage_roof_cup_drop_z,
                       blinder_z1 - garage_roof_cup_drop_z);
        }
    }
}
// =========================================================
// GEOMETRY
// =========================================================
rig_wall_extra_x = 3.0;
rig_wall_extra_z = 2.0;

// shifts only the wall profile upward so its ledge/bar Z can match wet rig
clock_wall_profile_dz = 5.0;
module wall_only() {
    if (show_wall)
        translate([0, 0, canonical_wall_z0])
            linear_extrude(height = wall_h)
                polygon(points = [
                    [canonical_wall_x0, 0],
                    [canonical_wall_x1 - rig_right_edge_lead_in, 0],
                    [canonical_wall_x1,
                     wall_t - rig_right_edge_nose_t],
                    [canonical_wall_x1, wall_t],
                    [canonical_wall_x0, wall_t]
                ]);
}

module bayonet_stop_lug() {
    translate([pivot_x, 0, pivot_z])
        rotate([0, -bayonet_lug_angle, 0])
            hull() {
                // Begin within the supported post radius.
                rect_prism(neck_d / 2 - bayonet_lug_root_overlap,
                           post_d / 2,
                           post_y1 - bayonet_lug_slice_y, post_y1,
                           -bayonet_lug_tangent_w / 2,
                           bayonet_lug_tangent_w / 2);

                // Grow gradually to a simple symmetric printable tip at the
                // neck end; the diagonal keyway supplies the asymmetry.
                rect_prism(neck_d / 2 - bayonet_lug_root_overlap,
                           bayonet_lug_outer_r,
                           neck_y1, neck_y1 + bayonet_lug_slice_y,
                           -bayonet_lug_tip_w / 2,
                           bayonet_lug_tip_w / 2);
            }
}

module latch_base_only() {
    union() {
        // Round wall-rooted pedestal: the complete rectangular pad is gone,
        // leaving a direct and rotation-friendly load path to the pivot stack.
        translate([pivot_x,0,pivot_z])
            cyl_y_span(pivot_boss_d, pad_y_wall, pad_y_out);

        translate([pivot_x,0,pivot_z]) {
            cyl_y_span(standoff_d, standoff_y0, standoff_y1);
            cyl_y_span(post_d,     post_y0,     post_y1);
            cyl_y_span(neck_d,     neck_y0,     neck_y1);
        }

        bayonet_stop_lug();
    }
}

module slotted_tunnel_only() {
    union() {
        difference() {
            union() {
                rect_prism(tunnel_x0, tunnel_x1, tunnel_y_front, tunnel_y_back, tunnel_z0, tunnel_z1);
                rect_prism(slot_x0, slot_x1,
                    slot_y0 - cubby_extra_y/2 - cubby_wall_y,
                    slot_y1 + cubby_extra_y/2 + cubby_wall_y,
                    tunnel_z0 - cubby_drop_z, tunnel_z0);
            }

            rect_prism(slot_x0, slot_x1, slot_y0, slot_y1, slot_z0, slot_z1);

            rect_prism(slot_x0, slot_x1,
                slot_y0 - cubby_extra_y/2,
                slot_y1 + cubby_extra_y/2,
                tunnel_z0 - cubby_drop_z + cubby_floor_z,
                tunnel_z0 - cubby_drop_z + cubby_floor_z + cubby_depth_z);
        }

        paper_glide_ramp(tunnel_x0, tunnel_x1,
                         tunnel_y_front, tunnel_y_back,
                         tunnel_z1);
    }
}

module tunnel_visor() {
    rect_prism(visor_x0, visor_x1, visor_y0, visor_y1, visor_z0, visor_z1);
}
visor_drop_corner_chop_x = 6.0;
visor_drop_corner_chop_z = 6.0;
module tunnel_visor_drop() {
    difference() {
        rect_prism(visor_drop_x0, visor_drop_x1,
                   visor_drop_y0, visor_drop_y1,
                   visor_drop_z0, visor_drop_z1);

        // remove bottom-outboard corner of vertical drop to avoid support
        rect_prism(
            visor_drop_x1 - visor_drop_corner_chop_x,
            visor_drop_x1 + eps,
            visor_drop_y0 - eps,
            visor_drop_y1 + eps,
            visor_drop_z0 - eps,
            visor_drop_z0 + visor_drop_corner_chop_z
        );
    }
}
module tunnel_inner_stop() {
    rect_prism(inner_stop_x0, inner_stop_x1, inner_stop_y0, inner_stop_y1, inner_stop_z0, inner_stop_z1);
}

module tunnel_system() {
    slotted_tunnel_only();
    // The former visor span, curtain, and inner stop restrained the old
    // uncontained weight/latch package. The pivot-constrained keyed corral
    // supersedes all three; leaving them out removes snagging surfaces from
    // the latch's swept path.
    tunnel_crook();
}

module fixed_rig(include_zipper_tunnel=true) {
    union() {
        wall_only();
        latch_base_only();
        if(include_zipper_tunnel)
            tunnel_system();
        carriage_blinders();
    }
}

module selected_rig(){
    if(wet)
        translate([2*wet_assembly_mirror_x,0,0])
            mirror([1,0,0])
                fixed_rig(false);
    else
        fixed_rig(true);
}

assert(bayonet_lug_angle == 0,
       "local rig retention requires the fixed nub to use its proven angle");

selected_rig();
